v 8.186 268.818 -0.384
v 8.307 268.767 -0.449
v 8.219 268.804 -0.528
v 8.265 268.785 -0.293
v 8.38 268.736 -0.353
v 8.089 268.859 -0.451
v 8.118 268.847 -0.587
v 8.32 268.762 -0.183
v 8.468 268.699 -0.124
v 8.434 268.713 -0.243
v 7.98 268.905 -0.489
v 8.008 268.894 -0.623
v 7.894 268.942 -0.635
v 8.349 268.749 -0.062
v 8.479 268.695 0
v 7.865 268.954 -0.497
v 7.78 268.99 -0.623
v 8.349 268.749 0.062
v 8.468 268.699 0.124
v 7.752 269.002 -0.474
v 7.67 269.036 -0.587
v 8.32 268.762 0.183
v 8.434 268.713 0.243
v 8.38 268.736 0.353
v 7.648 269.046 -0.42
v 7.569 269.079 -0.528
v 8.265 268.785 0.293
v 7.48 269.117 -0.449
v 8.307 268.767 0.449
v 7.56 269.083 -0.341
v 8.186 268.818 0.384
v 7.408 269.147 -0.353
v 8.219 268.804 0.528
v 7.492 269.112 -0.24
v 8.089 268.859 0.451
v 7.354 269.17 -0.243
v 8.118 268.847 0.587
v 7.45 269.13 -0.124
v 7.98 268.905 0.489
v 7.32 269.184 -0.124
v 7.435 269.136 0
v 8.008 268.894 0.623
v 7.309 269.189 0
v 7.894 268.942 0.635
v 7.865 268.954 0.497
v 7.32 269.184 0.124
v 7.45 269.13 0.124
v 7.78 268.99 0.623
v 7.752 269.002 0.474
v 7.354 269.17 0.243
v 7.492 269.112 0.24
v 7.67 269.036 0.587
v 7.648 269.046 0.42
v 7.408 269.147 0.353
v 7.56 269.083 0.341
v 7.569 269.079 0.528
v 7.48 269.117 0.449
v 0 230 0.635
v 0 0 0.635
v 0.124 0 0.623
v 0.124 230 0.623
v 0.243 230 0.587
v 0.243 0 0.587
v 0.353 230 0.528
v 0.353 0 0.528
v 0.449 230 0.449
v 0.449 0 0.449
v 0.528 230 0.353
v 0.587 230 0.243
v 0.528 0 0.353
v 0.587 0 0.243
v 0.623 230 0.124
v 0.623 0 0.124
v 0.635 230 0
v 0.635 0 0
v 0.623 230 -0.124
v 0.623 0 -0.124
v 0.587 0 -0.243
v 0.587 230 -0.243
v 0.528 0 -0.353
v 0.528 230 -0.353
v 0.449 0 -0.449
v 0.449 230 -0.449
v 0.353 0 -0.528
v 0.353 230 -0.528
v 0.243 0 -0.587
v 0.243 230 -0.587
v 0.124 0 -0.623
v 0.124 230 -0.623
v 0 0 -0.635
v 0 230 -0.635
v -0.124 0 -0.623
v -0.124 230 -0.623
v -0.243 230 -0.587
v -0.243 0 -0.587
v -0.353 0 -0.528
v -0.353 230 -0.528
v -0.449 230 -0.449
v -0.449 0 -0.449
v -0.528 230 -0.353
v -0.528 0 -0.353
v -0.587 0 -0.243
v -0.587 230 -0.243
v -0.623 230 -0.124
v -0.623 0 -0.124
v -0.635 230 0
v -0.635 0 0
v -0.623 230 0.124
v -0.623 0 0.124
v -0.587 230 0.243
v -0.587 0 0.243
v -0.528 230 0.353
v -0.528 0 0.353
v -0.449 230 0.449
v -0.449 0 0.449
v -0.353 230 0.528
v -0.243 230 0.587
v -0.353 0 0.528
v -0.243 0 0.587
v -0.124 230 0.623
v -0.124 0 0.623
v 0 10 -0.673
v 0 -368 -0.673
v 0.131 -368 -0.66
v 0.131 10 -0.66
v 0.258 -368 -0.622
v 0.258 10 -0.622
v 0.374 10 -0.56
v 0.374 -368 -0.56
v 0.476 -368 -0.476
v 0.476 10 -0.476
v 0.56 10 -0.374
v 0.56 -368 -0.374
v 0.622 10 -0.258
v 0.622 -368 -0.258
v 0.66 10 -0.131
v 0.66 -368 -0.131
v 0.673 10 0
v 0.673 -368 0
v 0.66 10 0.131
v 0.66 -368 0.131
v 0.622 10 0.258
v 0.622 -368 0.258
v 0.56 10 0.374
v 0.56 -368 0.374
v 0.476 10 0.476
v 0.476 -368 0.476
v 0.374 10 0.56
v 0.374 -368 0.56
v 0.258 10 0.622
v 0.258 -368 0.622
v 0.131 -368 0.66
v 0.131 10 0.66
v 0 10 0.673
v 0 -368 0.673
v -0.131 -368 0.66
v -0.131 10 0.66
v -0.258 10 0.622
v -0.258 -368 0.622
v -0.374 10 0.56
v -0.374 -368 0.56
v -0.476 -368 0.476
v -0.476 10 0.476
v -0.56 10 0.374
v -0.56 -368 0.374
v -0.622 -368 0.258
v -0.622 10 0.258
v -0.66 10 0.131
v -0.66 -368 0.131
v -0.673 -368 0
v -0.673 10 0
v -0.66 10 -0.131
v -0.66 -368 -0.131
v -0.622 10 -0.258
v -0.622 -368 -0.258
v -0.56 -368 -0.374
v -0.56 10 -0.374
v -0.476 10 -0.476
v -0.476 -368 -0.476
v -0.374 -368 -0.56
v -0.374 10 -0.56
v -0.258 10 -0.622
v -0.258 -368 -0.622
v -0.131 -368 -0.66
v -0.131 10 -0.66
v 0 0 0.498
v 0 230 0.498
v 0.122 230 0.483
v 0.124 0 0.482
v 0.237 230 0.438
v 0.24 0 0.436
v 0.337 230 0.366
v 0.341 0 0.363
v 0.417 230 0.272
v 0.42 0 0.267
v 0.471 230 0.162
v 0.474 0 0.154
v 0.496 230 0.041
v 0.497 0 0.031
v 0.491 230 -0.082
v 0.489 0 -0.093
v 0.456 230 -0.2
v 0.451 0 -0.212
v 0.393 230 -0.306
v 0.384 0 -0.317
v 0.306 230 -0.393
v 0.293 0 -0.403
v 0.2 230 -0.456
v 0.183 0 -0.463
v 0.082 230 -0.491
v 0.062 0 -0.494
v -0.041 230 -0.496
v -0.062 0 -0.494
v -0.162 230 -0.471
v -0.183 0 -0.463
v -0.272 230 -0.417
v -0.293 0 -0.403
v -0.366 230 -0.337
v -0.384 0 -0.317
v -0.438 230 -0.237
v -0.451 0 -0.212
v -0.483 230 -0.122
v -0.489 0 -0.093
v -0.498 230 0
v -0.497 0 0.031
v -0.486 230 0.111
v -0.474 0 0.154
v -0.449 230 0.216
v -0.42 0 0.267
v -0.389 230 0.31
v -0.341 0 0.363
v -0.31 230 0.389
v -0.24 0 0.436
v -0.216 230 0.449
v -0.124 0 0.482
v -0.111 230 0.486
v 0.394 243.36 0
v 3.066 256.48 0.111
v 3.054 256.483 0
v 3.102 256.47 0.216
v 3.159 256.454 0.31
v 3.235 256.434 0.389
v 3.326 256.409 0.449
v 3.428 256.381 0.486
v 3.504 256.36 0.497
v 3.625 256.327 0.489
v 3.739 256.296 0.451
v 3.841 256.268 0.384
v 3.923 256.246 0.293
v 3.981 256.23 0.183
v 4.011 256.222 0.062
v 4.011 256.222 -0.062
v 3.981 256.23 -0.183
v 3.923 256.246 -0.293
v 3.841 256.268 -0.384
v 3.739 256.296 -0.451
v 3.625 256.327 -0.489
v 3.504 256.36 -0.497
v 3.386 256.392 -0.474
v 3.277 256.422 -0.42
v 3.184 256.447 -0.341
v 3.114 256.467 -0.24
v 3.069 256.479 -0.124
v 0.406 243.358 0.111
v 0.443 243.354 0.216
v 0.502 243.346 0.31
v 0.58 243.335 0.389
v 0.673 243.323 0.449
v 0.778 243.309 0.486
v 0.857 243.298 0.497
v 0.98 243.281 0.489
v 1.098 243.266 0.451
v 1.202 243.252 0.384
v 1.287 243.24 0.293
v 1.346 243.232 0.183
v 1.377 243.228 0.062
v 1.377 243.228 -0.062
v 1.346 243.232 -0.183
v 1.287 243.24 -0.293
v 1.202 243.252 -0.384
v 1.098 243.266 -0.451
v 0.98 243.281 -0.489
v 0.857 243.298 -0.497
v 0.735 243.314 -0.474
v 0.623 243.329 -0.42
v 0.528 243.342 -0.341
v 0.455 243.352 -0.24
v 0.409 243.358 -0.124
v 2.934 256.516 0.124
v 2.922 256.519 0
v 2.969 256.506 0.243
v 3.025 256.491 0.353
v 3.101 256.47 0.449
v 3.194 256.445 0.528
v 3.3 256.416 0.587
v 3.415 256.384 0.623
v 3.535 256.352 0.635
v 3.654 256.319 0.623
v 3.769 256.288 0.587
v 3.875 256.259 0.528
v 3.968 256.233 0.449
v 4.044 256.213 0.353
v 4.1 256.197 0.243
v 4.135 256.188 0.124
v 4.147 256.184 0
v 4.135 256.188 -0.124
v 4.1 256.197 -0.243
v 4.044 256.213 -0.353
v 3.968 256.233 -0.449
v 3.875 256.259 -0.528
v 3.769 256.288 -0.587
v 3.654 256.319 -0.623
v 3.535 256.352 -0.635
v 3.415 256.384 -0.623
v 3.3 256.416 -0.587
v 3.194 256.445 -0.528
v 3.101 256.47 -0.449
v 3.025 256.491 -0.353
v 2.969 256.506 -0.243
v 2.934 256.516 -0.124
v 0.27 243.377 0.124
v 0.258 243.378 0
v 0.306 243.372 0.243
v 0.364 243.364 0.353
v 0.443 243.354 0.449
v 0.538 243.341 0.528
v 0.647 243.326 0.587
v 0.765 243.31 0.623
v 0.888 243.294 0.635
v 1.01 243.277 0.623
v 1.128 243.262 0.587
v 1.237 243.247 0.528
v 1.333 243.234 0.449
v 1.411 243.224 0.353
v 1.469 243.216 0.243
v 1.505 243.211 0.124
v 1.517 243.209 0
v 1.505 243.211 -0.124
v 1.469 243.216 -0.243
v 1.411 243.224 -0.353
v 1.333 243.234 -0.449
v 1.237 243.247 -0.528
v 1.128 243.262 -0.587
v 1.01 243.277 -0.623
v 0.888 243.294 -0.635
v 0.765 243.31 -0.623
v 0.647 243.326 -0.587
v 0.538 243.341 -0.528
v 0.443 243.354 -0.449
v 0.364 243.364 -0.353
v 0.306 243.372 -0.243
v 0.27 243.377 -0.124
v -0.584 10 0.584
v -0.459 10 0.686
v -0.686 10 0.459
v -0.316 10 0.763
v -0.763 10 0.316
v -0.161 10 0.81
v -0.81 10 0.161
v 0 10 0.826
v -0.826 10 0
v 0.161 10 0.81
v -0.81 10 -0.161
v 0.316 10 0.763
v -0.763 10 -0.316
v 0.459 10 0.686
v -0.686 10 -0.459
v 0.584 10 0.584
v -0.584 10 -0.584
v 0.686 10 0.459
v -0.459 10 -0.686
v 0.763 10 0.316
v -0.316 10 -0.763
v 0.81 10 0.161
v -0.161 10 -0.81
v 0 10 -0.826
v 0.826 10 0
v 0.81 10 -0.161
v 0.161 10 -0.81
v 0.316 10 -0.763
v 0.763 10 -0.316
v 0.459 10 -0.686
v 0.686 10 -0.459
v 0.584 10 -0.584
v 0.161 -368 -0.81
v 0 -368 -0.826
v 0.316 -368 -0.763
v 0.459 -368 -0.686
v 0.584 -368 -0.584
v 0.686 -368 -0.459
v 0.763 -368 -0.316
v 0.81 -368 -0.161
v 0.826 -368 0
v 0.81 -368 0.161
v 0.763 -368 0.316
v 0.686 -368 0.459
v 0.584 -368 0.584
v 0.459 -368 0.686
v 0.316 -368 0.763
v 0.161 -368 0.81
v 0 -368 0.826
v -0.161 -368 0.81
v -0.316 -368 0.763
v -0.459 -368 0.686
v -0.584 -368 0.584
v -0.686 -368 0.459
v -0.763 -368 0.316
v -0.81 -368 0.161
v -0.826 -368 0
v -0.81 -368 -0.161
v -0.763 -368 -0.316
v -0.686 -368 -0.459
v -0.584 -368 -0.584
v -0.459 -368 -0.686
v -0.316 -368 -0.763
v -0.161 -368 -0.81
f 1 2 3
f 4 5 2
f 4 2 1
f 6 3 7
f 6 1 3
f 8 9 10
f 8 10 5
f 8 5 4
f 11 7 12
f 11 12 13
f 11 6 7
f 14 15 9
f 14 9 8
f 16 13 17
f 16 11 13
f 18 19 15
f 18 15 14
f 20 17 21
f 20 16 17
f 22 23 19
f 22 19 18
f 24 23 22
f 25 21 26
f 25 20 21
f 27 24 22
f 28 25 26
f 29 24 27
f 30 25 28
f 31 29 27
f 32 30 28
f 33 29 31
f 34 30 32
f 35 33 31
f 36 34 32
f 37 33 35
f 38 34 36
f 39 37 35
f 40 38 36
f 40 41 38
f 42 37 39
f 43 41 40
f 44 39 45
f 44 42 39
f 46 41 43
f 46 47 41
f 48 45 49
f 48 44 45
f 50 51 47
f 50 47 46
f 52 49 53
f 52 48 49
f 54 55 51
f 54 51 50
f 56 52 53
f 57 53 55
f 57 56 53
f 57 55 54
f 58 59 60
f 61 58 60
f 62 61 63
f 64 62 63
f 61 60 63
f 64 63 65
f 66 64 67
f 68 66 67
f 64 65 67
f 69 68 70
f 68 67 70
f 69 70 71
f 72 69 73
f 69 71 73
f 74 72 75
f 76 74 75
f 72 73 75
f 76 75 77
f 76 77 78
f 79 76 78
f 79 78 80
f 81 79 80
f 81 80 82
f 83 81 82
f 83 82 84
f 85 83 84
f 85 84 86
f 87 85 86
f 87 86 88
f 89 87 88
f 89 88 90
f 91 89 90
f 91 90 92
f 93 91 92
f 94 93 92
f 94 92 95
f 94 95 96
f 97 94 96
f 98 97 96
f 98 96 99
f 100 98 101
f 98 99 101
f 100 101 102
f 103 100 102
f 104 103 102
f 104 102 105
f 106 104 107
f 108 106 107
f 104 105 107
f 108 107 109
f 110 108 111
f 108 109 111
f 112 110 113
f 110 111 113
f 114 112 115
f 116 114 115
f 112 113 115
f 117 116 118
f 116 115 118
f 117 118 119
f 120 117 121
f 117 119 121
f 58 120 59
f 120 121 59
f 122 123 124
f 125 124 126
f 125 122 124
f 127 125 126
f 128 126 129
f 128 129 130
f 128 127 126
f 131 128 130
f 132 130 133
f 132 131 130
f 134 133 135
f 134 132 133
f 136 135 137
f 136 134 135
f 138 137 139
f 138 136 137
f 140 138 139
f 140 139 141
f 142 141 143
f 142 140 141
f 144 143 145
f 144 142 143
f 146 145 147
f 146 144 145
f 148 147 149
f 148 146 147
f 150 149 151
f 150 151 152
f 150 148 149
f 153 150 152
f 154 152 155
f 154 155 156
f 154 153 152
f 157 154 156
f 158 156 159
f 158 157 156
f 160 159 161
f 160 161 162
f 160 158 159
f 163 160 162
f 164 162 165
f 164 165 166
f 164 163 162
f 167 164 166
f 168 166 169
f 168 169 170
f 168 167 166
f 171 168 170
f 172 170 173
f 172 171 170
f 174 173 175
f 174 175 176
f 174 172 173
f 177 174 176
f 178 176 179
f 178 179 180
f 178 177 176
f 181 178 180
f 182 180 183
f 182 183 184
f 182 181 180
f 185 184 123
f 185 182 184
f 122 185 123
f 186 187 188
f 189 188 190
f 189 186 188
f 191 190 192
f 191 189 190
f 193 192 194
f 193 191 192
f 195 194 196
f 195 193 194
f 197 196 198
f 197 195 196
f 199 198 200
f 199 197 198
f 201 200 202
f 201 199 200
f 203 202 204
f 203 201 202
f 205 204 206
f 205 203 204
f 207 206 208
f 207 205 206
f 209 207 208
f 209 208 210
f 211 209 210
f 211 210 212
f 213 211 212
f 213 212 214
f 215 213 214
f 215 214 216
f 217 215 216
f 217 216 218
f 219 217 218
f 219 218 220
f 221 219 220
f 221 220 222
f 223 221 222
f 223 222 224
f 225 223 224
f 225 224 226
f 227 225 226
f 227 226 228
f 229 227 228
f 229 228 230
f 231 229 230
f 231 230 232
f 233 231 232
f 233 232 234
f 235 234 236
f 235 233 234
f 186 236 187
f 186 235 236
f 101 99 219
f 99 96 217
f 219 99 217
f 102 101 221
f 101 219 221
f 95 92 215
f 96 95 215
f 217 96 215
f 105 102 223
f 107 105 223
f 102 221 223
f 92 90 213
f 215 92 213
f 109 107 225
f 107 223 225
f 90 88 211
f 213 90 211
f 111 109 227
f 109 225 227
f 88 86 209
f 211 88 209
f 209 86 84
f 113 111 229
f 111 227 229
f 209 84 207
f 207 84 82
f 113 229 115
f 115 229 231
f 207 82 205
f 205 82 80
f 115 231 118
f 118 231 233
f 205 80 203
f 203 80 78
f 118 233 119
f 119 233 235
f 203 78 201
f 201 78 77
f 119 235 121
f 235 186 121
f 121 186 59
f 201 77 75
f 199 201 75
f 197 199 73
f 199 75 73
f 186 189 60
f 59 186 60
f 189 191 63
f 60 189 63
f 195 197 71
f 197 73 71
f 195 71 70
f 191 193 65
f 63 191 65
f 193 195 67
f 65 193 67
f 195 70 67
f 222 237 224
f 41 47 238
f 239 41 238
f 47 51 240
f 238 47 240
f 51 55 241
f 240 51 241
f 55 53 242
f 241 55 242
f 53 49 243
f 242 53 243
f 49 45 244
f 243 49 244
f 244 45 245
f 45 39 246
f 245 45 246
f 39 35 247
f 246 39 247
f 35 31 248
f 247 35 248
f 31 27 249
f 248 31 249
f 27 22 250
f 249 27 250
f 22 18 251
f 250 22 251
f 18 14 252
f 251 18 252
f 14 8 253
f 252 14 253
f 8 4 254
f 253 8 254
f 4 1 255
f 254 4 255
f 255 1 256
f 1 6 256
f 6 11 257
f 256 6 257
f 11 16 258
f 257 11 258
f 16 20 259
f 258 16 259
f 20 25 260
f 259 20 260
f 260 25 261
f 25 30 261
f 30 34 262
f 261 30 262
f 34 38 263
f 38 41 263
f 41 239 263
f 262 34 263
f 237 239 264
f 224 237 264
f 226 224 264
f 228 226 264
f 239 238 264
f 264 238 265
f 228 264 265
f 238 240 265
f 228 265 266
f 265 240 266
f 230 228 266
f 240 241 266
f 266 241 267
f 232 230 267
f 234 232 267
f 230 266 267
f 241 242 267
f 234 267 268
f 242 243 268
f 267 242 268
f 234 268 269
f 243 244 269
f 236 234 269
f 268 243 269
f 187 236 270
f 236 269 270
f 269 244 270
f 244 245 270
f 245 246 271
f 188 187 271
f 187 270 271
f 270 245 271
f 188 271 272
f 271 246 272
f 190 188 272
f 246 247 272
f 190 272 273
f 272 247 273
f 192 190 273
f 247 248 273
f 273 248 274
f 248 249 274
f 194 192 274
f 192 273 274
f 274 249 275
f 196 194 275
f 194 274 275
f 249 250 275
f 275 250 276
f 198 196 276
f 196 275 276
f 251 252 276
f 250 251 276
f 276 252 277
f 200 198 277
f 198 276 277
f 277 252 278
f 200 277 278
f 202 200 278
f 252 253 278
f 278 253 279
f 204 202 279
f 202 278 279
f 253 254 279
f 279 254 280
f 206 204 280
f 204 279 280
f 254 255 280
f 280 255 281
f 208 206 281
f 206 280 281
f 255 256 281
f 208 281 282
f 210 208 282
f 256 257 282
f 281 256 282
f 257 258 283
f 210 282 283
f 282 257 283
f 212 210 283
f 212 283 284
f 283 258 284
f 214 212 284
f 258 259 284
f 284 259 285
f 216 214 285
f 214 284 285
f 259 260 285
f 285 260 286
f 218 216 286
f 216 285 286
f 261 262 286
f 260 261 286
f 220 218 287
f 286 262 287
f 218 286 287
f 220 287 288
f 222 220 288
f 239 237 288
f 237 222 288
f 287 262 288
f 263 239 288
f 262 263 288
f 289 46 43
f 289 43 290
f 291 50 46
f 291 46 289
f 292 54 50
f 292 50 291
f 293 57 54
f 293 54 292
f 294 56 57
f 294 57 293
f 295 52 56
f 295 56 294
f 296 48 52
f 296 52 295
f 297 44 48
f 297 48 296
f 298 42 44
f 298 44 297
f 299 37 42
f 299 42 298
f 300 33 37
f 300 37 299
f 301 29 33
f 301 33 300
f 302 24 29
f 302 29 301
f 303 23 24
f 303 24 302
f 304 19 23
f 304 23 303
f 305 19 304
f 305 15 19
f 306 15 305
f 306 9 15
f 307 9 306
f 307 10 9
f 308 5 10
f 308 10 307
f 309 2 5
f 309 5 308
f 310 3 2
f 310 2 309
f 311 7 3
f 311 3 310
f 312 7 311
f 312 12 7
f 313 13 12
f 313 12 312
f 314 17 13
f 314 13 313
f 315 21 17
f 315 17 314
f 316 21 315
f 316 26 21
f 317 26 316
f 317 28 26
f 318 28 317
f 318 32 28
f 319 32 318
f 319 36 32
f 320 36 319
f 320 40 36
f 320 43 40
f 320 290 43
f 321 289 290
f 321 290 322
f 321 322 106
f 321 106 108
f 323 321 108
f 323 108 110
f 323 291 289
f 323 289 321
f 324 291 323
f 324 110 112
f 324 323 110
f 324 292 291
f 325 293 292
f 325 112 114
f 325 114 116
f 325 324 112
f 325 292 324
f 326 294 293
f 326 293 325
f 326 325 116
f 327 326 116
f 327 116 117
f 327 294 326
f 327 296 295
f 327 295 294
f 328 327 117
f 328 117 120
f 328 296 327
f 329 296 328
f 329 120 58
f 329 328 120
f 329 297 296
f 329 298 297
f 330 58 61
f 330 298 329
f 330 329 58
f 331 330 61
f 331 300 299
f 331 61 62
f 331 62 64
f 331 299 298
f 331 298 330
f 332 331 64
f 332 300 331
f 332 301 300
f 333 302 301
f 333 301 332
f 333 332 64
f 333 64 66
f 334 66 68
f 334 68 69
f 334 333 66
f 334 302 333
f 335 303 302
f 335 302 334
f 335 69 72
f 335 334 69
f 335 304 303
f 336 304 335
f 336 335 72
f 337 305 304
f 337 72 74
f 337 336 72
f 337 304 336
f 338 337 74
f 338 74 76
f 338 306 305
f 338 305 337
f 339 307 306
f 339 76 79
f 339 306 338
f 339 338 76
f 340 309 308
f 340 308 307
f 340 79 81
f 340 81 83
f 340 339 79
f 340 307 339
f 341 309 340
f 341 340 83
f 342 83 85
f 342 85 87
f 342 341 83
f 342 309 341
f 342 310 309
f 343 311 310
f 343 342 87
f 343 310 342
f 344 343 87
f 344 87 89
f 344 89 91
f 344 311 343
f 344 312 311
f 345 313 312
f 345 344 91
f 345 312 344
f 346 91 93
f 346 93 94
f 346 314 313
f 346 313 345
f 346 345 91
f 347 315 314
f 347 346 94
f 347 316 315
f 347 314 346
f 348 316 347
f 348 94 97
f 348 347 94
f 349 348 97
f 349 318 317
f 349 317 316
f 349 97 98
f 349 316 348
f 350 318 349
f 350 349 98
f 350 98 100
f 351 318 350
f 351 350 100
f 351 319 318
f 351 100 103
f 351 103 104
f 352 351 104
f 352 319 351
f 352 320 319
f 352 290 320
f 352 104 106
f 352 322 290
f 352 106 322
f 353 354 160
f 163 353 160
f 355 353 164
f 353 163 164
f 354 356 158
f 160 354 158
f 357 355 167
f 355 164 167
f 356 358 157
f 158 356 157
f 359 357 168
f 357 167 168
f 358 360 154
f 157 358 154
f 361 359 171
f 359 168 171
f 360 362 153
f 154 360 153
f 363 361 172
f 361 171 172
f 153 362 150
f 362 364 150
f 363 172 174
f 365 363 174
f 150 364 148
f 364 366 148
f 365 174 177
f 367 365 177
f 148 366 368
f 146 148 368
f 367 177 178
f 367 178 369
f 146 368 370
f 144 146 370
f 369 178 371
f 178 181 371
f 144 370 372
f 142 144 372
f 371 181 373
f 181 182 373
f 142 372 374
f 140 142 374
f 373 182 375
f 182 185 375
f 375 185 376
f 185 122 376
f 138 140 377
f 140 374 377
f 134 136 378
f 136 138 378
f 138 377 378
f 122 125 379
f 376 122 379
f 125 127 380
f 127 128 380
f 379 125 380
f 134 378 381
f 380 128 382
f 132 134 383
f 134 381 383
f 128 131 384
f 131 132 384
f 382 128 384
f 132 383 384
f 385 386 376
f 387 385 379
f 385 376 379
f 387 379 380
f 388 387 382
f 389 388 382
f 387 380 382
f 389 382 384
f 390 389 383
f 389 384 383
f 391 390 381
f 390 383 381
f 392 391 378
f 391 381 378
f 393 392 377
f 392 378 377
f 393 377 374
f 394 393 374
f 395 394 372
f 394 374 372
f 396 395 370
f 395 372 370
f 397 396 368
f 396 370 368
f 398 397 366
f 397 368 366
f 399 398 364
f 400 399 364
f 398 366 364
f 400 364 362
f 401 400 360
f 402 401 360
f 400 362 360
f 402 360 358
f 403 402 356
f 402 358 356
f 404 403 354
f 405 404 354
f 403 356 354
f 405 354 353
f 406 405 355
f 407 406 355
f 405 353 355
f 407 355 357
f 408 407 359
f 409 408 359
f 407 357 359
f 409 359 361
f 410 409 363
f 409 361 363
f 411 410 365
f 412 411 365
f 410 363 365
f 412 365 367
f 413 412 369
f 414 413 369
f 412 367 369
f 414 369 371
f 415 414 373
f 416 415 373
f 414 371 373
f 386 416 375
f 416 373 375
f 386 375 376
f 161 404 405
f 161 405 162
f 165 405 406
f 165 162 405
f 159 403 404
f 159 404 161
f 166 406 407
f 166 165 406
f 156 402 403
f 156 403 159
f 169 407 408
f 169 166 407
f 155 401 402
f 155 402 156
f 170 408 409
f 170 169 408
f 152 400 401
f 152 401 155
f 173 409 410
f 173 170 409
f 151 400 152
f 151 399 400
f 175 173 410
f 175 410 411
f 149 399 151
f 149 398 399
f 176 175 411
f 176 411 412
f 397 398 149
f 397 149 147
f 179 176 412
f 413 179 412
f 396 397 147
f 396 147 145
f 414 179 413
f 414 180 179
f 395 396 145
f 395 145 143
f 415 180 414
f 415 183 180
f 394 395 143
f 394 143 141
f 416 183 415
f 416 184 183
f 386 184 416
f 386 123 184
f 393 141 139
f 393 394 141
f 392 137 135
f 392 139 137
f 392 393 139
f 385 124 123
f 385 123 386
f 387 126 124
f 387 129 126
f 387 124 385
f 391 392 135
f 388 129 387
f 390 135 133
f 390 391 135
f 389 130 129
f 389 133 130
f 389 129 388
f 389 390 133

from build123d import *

# Parameters (mm, degrees)
SKETCH1_R           = 0.635
SKETCH1_R_2         = 0.498
BOSS_EXTRUDE1_DEPTH = 230
SWEEP2_OUTLINE_R    = 0.635
SWEEP2_OUTLINE_R_2  = 0.498
SWEEP2_ANGLE        = 22.918312
SKETCH4_R           = 0.8255
SKETCH4_R_2         = 0.673
BOSS_EXTRUDE2_DEPTH = 378


# Read off the part's stored shape, not the designer's step: Sweep2
with BuildPart() as part:
    # Sketch1 → Boss-Extrude1 (new body)
    with BuildSketch(Plane(origin=(0, 0, 0), x_dir=(1, 0, 0), z_dir=(0, 1, 0))):
        with Locations(Location((0, 0, 0), (0, 0, 270))):
            Circle(SKETCH1_R)
        with Locations(Location((0, 0, 0), (0, 0, 270))):
            Circle(SKETCH1_R_2, mode=Mode.SUBTRACT)
    extrude(amount=BOSS_EXTRUDE1_DEPTH)

    # Sweep2 outline → Sweep2 (revolve)
    with BuildSketch(Plane(origin=(100, 230, 0), x_dir=(-0.9210609940028842, 0.3894183423086526, 0), z_dir=(0.3894183423086526, 0.9210609940028842, 0))):
        with Locations((100, 0)):
            Circle(SWEEP2_OUTLINE_R)
        with Locations((100, 0)):
            Circle(SWEEP2_OUTLINE_R_2, mode=Mode.SUBTRACT)
    revolve(axis=Axis((100, 230, 0), (0, 0, 1)), revolution_arc=SWEEP2_ANGLE)


with BuildPart() as body_2:
    # Sketch4 → Boss-Extrude2 (new body)
    with BuildSketch(Plane(origin=(0, 10, 0), x_dir=(-1, 0, 0), z_dir=(0, -1, 0))):
        with Locations(Location((0, 0, 0), (0, 0, 90))):
            Circle(SKETCH4_R)
        with Locations(Location((0, 0, 0), (0, 0, 90))):
            Circle(SKETCH4_R_2, mode=Mode.SUBTRACT)
    extrude(amount=BOSS_EXTRUDE2_DEPTH)


solid = Compound([part.part, body_2.part])
